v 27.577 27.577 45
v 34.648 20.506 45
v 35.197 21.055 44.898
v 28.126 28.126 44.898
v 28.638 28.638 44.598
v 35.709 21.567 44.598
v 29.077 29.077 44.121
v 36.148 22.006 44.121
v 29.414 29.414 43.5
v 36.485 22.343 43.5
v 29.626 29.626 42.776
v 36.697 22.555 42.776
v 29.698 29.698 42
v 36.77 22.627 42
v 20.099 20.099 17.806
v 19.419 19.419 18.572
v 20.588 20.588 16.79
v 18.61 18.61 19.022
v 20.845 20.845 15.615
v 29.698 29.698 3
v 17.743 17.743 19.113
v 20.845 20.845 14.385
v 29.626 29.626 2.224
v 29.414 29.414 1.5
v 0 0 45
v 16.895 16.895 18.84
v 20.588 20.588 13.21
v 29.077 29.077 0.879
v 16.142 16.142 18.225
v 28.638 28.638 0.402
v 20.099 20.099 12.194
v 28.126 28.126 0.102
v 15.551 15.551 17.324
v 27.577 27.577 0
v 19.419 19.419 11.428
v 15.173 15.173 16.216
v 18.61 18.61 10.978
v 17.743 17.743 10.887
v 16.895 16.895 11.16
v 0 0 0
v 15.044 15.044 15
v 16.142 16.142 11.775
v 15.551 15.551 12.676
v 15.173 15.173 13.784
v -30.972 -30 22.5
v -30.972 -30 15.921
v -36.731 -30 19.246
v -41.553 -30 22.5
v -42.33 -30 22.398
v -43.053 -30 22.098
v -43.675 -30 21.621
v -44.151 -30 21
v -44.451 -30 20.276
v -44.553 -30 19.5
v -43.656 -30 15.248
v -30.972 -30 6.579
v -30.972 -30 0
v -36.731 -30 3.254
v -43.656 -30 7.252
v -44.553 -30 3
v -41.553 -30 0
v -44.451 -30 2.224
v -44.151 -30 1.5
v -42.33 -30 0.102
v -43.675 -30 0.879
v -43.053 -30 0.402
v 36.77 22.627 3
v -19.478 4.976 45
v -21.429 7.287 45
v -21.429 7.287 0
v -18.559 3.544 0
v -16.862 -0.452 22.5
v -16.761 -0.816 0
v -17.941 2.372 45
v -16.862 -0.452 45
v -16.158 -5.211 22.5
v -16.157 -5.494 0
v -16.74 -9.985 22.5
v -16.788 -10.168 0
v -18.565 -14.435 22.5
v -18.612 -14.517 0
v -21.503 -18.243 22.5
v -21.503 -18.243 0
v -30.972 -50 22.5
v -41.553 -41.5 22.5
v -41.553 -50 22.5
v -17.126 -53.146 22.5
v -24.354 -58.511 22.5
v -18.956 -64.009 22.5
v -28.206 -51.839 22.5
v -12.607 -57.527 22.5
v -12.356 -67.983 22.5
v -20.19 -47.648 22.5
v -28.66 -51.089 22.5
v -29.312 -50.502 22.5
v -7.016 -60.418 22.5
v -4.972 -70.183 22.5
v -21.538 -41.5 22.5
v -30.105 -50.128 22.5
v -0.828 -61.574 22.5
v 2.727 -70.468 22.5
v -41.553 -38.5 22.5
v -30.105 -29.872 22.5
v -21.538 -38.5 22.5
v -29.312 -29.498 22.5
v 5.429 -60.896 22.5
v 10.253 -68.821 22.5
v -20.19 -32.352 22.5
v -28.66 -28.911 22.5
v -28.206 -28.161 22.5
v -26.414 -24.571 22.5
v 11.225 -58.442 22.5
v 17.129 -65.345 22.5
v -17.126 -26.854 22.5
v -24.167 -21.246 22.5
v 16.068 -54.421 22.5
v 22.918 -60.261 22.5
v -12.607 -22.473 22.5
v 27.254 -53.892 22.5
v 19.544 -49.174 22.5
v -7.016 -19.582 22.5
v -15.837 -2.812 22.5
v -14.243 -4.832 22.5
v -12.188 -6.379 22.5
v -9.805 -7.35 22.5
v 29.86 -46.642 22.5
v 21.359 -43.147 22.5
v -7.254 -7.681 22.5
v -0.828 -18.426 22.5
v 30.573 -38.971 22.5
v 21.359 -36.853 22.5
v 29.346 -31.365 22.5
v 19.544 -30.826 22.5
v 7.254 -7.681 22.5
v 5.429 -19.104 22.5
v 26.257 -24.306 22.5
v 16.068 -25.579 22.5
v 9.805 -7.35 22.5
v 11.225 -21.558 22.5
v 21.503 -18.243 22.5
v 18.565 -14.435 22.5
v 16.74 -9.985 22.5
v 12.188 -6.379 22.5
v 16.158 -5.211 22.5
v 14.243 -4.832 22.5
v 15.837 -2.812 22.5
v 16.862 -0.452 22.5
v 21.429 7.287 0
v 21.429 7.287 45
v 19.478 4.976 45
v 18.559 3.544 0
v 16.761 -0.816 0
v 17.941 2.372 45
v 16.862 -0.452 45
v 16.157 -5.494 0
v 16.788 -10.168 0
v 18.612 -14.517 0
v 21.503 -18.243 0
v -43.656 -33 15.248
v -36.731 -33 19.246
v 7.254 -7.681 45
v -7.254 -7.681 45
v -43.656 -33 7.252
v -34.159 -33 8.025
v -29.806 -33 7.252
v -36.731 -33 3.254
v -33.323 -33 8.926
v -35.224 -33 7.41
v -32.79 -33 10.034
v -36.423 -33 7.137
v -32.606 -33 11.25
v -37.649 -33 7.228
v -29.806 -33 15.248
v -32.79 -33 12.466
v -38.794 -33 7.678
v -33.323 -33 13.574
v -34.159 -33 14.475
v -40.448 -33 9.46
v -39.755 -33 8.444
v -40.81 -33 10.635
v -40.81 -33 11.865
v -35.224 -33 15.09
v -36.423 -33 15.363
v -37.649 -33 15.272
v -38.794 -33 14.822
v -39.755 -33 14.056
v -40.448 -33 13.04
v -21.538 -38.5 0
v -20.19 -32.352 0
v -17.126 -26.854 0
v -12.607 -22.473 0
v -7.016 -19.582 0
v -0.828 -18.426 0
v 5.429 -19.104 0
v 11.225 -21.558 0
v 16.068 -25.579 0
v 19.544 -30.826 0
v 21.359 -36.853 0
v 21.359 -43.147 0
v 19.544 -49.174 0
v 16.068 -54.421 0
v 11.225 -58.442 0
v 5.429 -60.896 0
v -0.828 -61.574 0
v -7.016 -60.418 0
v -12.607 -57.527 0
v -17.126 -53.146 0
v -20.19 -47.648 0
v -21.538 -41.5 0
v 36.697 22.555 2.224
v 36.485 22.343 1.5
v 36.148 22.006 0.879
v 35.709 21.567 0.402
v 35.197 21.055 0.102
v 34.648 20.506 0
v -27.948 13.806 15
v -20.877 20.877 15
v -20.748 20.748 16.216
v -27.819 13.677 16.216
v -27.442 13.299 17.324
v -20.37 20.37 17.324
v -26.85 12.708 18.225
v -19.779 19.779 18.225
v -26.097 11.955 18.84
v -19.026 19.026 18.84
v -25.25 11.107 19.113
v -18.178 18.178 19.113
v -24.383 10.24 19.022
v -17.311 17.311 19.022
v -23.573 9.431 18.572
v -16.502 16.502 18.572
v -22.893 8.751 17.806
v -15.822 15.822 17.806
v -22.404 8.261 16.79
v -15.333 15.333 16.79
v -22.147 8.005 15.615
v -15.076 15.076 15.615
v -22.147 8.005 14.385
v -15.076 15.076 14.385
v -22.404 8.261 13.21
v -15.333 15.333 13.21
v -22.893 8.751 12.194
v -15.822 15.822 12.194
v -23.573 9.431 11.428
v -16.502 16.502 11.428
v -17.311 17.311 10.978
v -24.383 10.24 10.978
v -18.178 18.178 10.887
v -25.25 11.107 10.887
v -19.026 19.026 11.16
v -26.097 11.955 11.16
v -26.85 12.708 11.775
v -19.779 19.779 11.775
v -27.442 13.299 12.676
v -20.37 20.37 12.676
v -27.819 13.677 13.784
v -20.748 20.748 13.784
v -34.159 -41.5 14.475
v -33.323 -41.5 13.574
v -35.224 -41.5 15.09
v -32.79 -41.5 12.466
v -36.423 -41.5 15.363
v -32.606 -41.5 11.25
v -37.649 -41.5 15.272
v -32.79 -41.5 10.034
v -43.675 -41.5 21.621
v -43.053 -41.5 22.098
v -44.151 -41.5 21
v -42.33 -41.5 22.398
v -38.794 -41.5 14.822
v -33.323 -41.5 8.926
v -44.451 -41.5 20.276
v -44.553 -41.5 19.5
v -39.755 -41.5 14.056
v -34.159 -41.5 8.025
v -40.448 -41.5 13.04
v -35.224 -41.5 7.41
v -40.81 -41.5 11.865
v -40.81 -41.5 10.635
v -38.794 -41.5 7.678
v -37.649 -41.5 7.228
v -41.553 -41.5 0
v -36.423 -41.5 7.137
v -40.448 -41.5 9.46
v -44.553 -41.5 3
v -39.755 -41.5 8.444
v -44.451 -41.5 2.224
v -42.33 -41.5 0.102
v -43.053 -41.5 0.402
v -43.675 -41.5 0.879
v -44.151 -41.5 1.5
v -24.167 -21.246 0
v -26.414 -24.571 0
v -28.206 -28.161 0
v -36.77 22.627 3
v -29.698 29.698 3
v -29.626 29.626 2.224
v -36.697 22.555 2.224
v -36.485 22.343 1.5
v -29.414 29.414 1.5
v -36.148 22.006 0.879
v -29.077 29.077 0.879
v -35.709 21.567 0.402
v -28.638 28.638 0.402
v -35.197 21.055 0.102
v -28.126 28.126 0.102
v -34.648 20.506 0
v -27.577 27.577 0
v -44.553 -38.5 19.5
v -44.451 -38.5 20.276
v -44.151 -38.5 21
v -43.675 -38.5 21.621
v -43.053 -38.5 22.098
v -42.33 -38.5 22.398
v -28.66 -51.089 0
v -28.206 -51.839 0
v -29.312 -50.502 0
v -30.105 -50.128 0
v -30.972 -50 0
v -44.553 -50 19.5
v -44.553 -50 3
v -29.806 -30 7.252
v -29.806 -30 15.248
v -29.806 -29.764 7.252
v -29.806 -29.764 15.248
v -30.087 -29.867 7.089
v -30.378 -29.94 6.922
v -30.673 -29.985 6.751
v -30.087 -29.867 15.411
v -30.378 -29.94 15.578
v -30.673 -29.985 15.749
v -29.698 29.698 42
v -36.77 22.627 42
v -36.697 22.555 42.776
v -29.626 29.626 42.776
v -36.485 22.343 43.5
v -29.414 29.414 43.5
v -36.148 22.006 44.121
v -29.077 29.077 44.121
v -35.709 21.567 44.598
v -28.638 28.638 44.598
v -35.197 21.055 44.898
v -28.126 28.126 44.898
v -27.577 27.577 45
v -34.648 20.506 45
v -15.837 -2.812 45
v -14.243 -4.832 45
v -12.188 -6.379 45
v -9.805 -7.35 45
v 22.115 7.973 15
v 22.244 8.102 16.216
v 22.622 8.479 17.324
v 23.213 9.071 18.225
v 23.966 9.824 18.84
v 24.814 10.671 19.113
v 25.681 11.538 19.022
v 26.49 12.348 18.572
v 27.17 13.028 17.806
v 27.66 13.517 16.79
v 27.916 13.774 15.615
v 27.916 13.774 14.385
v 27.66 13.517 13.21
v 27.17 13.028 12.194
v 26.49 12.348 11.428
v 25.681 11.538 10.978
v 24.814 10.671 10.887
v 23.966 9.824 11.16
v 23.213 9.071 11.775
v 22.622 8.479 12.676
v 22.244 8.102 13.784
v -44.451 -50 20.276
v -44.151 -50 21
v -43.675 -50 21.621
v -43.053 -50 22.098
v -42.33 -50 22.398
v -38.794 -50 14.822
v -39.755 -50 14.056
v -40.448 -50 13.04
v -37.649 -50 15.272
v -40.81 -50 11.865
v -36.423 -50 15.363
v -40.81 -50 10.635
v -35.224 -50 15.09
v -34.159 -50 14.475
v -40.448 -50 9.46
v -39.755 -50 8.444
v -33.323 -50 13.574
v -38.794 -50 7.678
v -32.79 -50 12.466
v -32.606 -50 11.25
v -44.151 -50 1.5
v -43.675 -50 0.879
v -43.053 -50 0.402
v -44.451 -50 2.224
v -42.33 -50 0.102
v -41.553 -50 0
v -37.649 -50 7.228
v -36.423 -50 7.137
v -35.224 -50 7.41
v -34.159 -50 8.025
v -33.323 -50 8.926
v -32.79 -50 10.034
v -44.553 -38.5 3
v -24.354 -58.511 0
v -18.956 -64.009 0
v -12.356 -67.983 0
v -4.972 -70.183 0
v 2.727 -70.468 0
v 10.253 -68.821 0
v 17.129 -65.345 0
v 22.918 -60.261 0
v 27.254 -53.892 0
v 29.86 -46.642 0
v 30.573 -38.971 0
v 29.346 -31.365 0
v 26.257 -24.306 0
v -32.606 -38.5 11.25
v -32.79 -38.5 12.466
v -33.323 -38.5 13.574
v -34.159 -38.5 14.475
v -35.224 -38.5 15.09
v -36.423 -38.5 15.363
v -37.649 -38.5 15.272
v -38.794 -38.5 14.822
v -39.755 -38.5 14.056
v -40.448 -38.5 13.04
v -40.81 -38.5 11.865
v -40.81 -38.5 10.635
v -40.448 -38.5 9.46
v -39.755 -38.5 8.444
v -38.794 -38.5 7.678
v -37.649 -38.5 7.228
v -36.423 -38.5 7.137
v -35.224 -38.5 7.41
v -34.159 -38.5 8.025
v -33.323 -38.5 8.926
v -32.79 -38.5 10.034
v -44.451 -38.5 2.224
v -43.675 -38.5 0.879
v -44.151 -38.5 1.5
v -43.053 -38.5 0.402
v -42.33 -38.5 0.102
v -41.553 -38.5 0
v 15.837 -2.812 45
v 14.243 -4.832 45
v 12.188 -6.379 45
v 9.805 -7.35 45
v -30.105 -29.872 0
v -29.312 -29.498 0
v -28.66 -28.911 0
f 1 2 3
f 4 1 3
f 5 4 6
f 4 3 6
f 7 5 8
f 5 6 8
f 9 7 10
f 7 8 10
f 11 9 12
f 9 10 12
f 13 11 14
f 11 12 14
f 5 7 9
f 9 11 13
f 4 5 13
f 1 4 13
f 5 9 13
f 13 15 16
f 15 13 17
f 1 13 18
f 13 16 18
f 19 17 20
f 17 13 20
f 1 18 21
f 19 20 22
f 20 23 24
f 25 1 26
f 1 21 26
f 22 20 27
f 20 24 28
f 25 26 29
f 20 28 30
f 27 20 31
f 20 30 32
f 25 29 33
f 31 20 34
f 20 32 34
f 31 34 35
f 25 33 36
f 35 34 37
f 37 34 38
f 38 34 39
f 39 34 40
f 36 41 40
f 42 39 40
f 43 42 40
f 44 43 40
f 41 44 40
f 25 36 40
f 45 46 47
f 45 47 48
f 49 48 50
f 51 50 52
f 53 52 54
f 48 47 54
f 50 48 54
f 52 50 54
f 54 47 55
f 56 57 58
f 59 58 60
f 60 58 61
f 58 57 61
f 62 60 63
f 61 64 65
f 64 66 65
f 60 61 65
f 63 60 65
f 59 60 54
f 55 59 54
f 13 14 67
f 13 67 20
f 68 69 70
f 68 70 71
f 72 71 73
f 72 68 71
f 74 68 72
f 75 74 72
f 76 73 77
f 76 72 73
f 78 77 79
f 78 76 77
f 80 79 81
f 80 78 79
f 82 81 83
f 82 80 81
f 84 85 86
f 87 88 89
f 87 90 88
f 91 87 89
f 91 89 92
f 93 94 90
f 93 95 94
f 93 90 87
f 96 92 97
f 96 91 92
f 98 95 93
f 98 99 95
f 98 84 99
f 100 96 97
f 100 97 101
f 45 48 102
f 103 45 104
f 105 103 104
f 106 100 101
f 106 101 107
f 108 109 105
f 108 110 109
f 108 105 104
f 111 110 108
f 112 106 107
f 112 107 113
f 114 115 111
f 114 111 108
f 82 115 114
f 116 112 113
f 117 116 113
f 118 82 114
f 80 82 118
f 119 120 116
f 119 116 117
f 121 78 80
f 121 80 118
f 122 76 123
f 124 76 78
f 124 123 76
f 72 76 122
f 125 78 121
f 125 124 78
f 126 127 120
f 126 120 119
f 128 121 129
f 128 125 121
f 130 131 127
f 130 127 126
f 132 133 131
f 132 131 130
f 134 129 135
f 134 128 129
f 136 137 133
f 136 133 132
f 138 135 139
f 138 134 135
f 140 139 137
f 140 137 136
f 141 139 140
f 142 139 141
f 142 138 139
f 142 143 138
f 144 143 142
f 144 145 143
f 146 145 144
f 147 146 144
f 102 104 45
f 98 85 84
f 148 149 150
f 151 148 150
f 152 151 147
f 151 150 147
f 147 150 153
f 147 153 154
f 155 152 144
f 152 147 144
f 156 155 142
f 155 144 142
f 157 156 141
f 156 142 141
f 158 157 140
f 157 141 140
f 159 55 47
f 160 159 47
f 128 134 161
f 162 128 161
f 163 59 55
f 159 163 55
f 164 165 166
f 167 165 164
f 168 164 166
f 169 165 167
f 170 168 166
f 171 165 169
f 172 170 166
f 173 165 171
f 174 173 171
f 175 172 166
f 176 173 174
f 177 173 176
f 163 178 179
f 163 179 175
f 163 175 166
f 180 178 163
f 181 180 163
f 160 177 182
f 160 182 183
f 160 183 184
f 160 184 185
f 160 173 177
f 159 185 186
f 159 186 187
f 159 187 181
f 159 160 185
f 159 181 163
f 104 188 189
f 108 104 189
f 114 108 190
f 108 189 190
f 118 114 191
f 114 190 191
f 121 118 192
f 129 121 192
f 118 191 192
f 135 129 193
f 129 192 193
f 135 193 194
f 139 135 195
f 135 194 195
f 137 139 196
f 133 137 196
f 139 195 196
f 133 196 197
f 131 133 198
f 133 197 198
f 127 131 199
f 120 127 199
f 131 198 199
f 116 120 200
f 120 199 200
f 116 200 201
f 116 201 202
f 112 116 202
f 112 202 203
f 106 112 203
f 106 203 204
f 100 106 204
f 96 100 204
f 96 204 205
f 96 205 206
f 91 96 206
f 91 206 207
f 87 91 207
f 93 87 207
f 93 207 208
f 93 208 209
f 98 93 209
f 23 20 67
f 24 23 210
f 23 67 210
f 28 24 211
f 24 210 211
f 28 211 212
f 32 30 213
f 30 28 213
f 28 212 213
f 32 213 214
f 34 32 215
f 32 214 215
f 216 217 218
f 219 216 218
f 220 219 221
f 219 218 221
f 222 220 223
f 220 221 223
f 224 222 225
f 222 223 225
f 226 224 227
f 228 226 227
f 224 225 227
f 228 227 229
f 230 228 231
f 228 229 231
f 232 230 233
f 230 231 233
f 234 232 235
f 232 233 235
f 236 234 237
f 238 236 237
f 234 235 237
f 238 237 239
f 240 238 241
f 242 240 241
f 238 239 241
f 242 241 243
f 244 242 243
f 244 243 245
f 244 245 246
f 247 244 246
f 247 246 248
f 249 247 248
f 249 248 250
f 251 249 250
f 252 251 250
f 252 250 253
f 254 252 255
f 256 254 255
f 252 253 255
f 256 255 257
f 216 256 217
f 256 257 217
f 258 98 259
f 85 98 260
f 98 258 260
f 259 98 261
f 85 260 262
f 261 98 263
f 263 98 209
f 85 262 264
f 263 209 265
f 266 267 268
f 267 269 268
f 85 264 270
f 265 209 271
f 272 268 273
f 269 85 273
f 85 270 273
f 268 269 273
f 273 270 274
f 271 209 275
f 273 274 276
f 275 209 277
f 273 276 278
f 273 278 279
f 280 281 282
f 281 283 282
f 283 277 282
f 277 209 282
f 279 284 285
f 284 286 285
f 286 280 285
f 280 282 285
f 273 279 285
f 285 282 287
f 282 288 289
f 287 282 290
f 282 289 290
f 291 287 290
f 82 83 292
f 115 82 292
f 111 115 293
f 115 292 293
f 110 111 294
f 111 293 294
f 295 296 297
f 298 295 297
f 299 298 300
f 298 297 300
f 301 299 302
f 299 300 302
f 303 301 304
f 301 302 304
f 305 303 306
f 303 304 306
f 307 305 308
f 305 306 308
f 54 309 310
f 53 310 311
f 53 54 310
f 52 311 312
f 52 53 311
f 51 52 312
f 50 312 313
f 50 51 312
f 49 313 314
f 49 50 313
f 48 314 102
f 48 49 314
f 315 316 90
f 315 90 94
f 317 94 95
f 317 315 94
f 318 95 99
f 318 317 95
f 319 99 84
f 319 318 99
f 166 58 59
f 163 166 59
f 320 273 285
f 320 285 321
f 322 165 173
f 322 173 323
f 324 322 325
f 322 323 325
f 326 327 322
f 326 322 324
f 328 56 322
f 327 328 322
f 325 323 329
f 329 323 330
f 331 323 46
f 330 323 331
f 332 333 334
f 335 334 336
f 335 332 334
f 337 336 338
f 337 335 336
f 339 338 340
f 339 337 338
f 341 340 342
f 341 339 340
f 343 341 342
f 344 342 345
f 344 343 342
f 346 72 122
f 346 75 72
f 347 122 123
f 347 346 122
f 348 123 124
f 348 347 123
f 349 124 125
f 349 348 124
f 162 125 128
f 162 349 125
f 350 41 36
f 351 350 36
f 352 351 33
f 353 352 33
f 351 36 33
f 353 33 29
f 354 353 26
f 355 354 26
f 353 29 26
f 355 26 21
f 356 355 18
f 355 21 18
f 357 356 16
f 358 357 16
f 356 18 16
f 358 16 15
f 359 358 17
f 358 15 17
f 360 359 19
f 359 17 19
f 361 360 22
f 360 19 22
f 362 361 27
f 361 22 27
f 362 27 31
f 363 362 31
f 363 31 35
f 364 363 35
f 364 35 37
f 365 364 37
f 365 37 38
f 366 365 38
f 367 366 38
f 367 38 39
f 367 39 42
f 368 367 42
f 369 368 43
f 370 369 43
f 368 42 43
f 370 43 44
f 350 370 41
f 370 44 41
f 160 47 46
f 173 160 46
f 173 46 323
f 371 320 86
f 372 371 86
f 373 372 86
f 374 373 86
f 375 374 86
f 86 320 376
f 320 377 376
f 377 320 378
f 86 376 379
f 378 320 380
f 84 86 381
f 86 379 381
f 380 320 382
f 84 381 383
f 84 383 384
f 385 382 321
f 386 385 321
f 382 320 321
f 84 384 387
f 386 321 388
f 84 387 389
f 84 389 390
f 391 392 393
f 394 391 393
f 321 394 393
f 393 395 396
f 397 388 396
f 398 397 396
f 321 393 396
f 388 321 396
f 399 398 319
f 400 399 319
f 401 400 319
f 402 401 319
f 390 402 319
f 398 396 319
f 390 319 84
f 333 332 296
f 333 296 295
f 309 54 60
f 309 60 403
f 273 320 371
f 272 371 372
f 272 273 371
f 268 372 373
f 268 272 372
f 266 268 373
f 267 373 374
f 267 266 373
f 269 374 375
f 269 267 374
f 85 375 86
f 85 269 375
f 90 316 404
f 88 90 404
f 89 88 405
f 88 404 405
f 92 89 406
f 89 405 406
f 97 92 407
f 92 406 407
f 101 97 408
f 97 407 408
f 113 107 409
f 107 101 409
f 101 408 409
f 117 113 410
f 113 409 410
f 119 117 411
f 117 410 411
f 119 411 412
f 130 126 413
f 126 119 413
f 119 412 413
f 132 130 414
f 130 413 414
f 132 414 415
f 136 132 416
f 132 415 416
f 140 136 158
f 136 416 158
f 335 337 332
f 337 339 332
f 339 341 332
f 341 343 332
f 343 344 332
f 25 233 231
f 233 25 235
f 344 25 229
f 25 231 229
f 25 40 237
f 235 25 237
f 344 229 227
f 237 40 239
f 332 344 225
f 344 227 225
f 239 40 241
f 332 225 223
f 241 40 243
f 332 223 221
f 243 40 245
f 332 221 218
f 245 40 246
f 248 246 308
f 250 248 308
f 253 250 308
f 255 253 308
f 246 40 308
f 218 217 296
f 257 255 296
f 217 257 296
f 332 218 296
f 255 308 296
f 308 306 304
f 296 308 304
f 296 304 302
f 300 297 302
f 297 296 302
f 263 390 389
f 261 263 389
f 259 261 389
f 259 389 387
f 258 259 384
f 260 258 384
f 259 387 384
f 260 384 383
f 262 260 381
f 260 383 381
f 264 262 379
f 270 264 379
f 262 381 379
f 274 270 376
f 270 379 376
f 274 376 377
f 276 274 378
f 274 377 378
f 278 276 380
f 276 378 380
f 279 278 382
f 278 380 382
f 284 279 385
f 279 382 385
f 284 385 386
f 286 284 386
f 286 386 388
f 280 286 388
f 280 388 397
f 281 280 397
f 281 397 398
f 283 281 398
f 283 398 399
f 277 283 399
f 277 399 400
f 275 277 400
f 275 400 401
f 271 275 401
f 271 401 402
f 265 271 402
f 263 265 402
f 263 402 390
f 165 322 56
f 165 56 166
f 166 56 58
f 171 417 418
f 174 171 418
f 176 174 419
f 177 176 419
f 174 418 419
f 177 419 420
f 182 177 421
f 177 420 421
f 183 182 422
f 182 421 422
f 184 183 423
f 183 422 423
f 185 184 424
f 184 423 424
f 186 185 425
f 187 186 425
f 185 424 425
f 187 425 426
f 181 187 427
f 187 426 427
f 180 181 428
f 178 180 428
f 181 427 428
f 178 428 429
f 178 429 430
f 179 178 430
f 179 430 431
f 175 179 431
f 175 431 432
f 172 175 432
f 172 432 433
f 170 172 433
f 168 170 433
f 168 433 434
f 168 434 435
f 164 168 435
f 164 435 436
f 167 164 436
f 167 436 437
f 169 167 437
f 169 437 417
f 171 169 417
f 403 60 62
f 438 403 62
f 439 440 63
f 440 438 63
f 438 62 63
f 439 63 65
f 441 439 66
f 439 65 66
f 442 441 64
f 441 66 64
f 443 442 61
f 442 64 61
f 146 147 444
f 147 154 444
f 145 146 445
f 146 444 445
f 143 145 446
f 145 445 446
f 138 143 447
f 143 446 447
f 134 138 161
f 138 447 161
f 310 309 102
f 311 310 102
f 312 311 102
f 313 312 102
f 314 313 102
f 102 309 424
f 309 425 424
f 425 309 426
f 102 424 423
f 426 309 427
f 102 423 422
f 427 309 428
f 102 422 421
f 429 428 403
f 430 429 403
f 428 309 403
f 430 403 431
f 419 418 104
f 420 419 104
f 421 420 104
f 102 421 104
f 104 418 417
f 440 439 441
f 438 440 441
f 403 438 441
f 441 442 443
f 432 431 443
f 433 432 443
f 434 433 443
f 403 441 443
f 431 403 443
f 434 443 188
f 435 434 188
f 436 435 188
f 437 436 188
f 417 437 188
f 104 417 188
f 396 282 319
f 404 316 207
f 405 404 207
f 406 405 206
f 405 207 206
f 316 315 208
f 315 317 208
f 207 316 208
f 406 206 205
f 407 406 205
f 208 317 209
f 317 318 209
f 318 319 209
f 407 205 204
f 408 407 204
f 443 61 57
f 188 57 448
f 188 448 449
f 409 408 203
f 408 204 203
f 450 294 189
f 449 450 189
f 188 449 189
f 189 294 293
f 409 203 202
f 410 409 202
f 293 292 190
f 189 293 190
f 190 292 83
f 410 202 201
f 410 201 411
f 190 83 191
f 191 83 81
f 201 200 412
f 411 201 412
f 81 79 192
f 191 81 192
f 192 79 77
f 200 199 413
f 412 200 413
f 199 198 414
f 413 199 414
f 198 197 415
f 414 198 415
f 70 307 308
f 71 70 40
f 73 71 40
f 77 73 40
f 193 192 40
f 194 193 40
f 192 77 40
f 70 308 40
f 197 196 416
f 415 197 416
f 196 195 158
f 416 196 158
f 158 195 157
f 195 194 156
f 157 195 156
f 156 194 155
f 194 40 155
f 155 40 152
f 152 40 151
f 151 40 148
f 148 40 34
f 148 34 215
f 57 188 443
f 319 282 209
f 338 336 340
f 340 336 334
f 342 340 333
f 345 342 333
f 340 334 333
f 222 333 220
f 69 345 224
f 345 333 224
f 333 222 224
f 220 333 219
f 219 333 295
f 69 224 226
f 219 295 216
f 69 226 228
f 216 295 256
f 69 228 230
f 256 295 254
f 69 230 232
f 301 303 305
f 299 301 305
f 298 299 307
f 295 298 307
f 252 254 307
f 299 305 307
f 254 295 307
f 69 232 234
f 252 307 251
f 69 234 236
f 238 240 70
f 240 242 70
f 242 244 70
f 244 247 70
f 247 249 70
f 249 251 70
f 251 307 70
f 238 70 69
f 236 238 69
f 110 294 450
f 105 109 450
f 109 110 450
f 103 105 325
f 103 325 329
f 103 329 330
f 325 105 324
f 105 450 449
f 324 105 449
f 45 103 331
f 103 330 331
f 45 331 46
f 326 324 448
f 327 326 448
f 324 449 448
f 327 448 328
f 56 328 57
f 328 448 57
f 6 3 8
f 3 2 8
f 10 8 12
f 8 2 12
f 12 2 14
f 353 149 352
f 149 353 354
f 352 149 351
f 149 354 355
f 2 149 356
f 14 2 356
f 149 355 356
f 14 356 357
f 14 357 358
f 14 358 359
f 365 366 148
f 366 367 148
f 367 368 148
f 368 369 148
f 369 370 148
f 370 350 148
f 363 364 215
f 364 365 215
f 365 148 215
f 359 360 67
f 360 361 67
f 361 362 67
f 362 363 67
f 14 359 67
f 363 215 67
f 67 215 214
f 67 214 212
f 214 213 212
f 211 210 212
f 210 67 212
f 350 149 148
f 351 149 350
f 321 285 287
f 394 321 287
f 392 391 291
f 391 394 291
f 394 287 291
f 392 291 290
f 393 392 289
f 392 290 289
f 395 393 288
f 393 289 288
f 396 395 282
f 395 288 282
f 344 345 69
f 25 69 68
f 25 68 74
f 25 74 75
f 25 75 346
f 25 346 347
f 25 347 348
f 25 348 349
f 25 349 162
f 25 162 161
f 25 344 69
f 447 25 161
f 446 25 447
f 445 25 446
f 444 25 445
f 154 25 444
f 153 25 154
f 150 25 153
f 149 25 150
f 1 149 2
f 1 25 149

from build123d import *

# Parameters (mm, degrees)
F1_DEPTH      = 45
F2_R          = 4.125
F3_DEPTH      = 10
F4_R          = 4.125
F5_DEPTH      = 10
F6_R          = 4.125
F7_DEPTH      = 20
F9_DEPTH      = 3
F10_R         = 18
F11_W         = 72.4435358676
F11_H         = 36.0539390085
F12_DEPTH     = 100
F13_T1_DEPTH  = 22.5
F13_T6_DEPTH  = 22.5
F13_T12_DEPTH = 22.5
F13_T18_DEPTH = 22.5
F13_T25_DEPTH = 22.5
F13_T31_DEPTH = 22.5
F13_T34_DEPTH = 23.5
F13_T36_DEPTH = 23.5
F13_T38_DEPTH = 25
F13_T40_DEPTH = 25
F14_R         = 10


# Not quite as in the source:
# - a fillet or chamfer that OpenCascade refuses, or shapes differently, is made with other operations: its cross-section is extruded or revolved along the edge and cut away or added


with BuildPart() as f1:
    # F0 (on Top) → F1 (new body)
    with BuildSketch(Plane.XY):
        with BuildLine():
            Line((29.6984848098, 29.6984848098), (0, 0))
            Line((0, 0), (-29.6984848098, 29.6984848098))
            Line((-29.6984848098, 29.6984848098), (-36.7695526217, 22.627416998))
            Line((-36.7695526217, 22.627416998), (-4.4122546938, -9.7298809299))
            ThreePointArc((-4.4122546938, -9.7298809299), (-19.5013094439, -16.4320762481), (-28.9093081896, -30))
            ThreePointArc((-28.9093081896, -30), (-30.0334813831, -34.1915496034), (-30.5532011416, -38.5))
            Line((-30.5532011416, -38.5), (-21.53782951, -38.5))
            ThreePointArc((-21.53782951, -38.5), (21.59, -40), (-21.53782951, -41.5))
            Line((-21.53782951, -41.5), (-30.5532011416, -41.5))
            ThreePointArc((-30.5532011416, -41.5), (-30.0334813831, -45.8084503966), (-28.9093081896, -50))
            ThreePointArc((-28.9093081896, -50), (23.5679237519, -59.5013094439), (4.4122546938, -9.7298809299))
            Line((4.4122546938, -9.7298809299), (36.7695526217, 22.627416998))
            Line((36.7695526217, 22.627416998), (29.6984848098, 29.6984848098))
        make_face()
        with BuildLine():
            ThreePointArc((-30.5532011416, -38.5), (-30.0334813831, -34.1915496034), (-28.9093081896, -30))
            Line((-28.9093081896, -30), (-44.5532011416, -30))
            Line((-44.5532011416, -30), (-44.5532011416, -38.5))
            Line((-44.5532011416, -38.5), (-30.5532011416, -38.5))
        make_face()
        with BuildLine():
            Line((-44.5532011416, -50), (-28.9093081896, -50))
            ThreePointArc((-28.9093081896, -50), (-30.0334813831, -45.8084503966), (-30.5532011416, -41.5))
            Line((-30.5532011416, -41.5), (-44.5532011416, -41.5))
            Line((-44.5532011416, -41.5), (-44.5532011416, -50))
        make_face()
    extrude(amount=F1_DEPTH)

    # F2 (on face) → F3 (cut, through all)
    with BuildSketch(Plane(origin=(0, 0, 0), x_dir=(-0.7071067812, -0.7071067812, 0), z_dir=(-0.7071067812, 0.7071067812, 0))):
        with Locations((-25.4, 15)):
            Circle(F2_R)
    extrude(amount=-F3_DEPTH, mode=Mode.SUBTRACT)

    # F4 (on face) → F5 (cut, through all)
    with BuildSketch(Plane(origin=(0, 0, 0), x_dir=(-0.7071067812, 0.7071067812, 0), z_dir=(0.7071067812, 0.7071067812, 0))):
        with Locations((25.4, 15)):
            Circle(F4_R)
    extrude(amount=-F5_DEPTH, mode=Mode.SUBTRACT)

    # F6 (on face) → F7 (cut, through all)
    with BuildSketch(Plane.XZ.offset(50)):
        with Locations((-36.7312546656, 33.75)):
            Circle(F6_R)
        with Locations((-36.7312546656, 11.25)):
            Circle(F6_R)
    extrude(amount=-F7_DEPTH, mode=Mode.SUBTRACT)

    # F8 (on face) → F9 (cut)
    with BuildSketch(Plane(origin=(0, -30, 0), x_dir=(-1, 0, 0), z_dir=(0, 1, 0))):
        Polygon((43.6562546656, 37.7481506141), (36.7312546656, 41.7463012283), (29.8062546656, 37.7481506141), (29.8062546656, 29.7518493859), (36.7312546656, 25.7536987717), (43.6562546656, 29.7518493859), align=None)
        Polygon((43.6562546656, 7.2518493859), (43.6562546656, 15.2481506141), (36.7312546656, 19.2463012283), (29.8062546656, 15.2481506141), (29.8062546656, 7.2518493859), (36.7312546656, 3.2536987717), align=None)
    extrude(amount=-F9_DEPTH, mode=Mode.SUBTRACT)

    # F10
    f10_edges = [f1.edges().sort_by_distance(p)[0] for p in [
        (-4.412255, -9.729881, 22.5),
        (4.412255, -9.729881, 22.5),
    ]]
    fillet(f10_edges, radius=F10_R)

    # F11 (on Right) → F12 (cut, symmetric)
    with BuildSketch(Plane.YZ):
        with Locations((-43.9025410381, 40.5269695042)):
            Rectangle(F11_W, F11_H)
    extrude(amount=F12_DEPTH, both=True, mode=Mode.SUBTRACT)

    # F13: fillet of radius 3 on 10 edges, made by hand

    # F13_s2 → F13_t1 (join)
    with BuildSketch(Plane.XY):
        with BuildLine():
            ThreePointArc((-28.206162374, -51.8389401608), (-29.3115301597, -50.5016826145), (-30.9723764022, -50))
            Line((-30.9723764022, -50), (-28.9093081896, -50))
            ThreePointArc((-28.9093081896, -50), (-28.5725334833, -50.9251283904), (-28.206162374, -51.8389401608))
        make_face()
    extrude(amount=F13_T1_DEPTH)


with BuildPart() as f13_tool4:
    # F13_s5 → F13_t6 (new body)
    with BuildSketch(Plane.XY):
        with BuildLine():
            ThreePointArc((-28.206162374, -28.1610598392), (-29.3115301597, -29.4983173855), (-30.9723764022, -30))
            Line((-30.9723764022, -30), (-28.9093081896, -30))
            ThreePointArc((-28.9093081896, -30), (-28.5725334833, -29.0748716096), (-28.206162374, -28.1610598392))
        make_face()
    extrude(amount=F13_T6_DEPTH)

    split(bisect_by=Plane(origin=(-10.5917065627, 0, 18.3453739054), x_dir=(0, 1, 0), z_dir=(0.5, 0, -0.8660254038)), keep=Keep.TOP)

    split(bisect_by=Plane.YZ.offset(-29.8062546656), keep=Keep.TOP)


with BuildPart() as f1_1:
    add(f1.part)

    # F13_t3: union F13_tool4
    add(f13_tool4.part)


with BuildPart() as f13_tool10:
    # F13_s11 → F13_t12 (new body)
    with BuildSketch(Plane.XY):
        with BuildLine():
            ThreePointArc((-28.206162374, -28.1610598392), (-29.3115301597, -29.4983173855), (-30.9723764022, -30))
            Line((-30.9723764022, -30), (-28.9093081896, -30))
            ThreePointArc((-28.9093081896, -30), (-28.5725334833, -29.0748716096), (-28.206162374, -28.1610598392))
        make_face()
    extrude(amount=F13_T12_DEPTH)

    split(bisect_by=Plane(origin=(-10.5917065627, 0, 18.3453739054), x_dir=(0, 1, 0), z_dir=(0.5, 0, -0.8660254038)), keep=Keep.TOP)

    split(bisect_by=Plane.YZ.offset(-29.8062546656), keep=Keep.BOTTOM)


with BuildPart() as f1_2:
    add(f1_1.part)

    # F13_t9: union F13_tool10
    add(f13_tool10.part)


with BuildPart() as f13_tool16:
    # F13_s17 → F13_t18 (new body)
    with BuildSketch(Plane.XY):
        with BuildLine():
            ThreePointArc((-28.206162374, -28.1610598392), (-29.3115301597, -29.4983173855), (-30.9723764022, -30))
            Line((-30.9723764022, -30), (-28.9093081896, -30))
            ThreePointArc((-28.9093081896, -30), (-28.5725334833, -29.0748716096), (-28.206162374, -28.1610598392))
        make_face()
    extrude(amount=F13_T18_DEPTH)

    split(bisect_by=Plane(origin=(-10.5917065627, 0, 18.3453739054), x_dir=(0, 1, 0), z_dir=(-0.5, 0, 0.8660254038)), keep=Keep.TOP)

    split(bisect_by=Plane.YZ.offset(-29.8062546656), keep=Keep.TOP)

    split(bisect_by=Plane(origin=(-0.8489207701, 0, -1.4703739054), x_dir=(0, 1, 0), z_dir=(-0.5, 0, -0.8660254038)), keep=Keep.TOP)


with BuildPart() as f1_3:
    add(f1_2.part)

    # F13_t15: union F13_tool16
    add(f13_tool16.part)


with BuildPart() as f13_tool23:
    # F13_s24 → F13_t25 (new body)
    with BuildSketch(Plane.XY):
        with BuildLine():
            ThreePointArc((-28.206162374, -28.1610598392), (-29.3115301597, -29.4983173855), (-30.9723764022, -30))
            Line((-30.9723764022, -30), (-28.9093081896, -30))
            ThreePointArc((-28.9093081896, -30), (-28.5725334833, -29.0748716096), (-28.206162374, -28.1610598392))
        make_face()
    extrude(amount=F13_T25_DEPTH)

    split(bisect_by=Plane.YZ.offset(-29.8062546656), keep=Keep.TOP)

    split(bisect_by=Plane(origin=(-0.8489207701, 0, -1.4703739054), x_dir=(0, 1, 0), z_dir=(0.5, 0, 0.8660254038)), keep=Keep.TOP)


with BuildPart() as f1_4:
    add(f1_3.part)

    # F13_t22: union F13_tool23
    add(f13_tool23.part)


with BuildPart() as f13_tool29:
    # F13_s30 → F13_t31 (new body)
    with BuildSketch(Plane.XY):
        with BuildLine():
            ThreePointArc((-28.206162374, -28.1610598392), (-29.3115301597, -29.4983173855), (-30.9723764022, -30))
            Line((-30.9723764022, -30), (-28.9093081896, -30))
            ThreePointArc((-28.9093081896, -30), (-28.5725334833, -29.0748716096), (-28.206162374, -28.1610598392))
        make_face()
    extrude(amount=F13_T31_DEPTH)

    split(bisect_by=Plane.YZ.offset(-29.8062546656), keep=Keep.BOTTOM)

    split(bisect_by=Plane(origin=(-0.8489207701, 0, -1.4703739054), x_dir=(0, 1, 0), z_dir=(0.5, 0, 0.8660254038)), keep=Keep.TOP)


with BuildPart() as f1_5:
    add(f1_4.part)

    # F13_t28: union F13_tool29
    add(f13_tool29.part)

    # F13_s35 → F13_t34 (cut)
    with BuildSketch(Plane.XZ.offset(34)):
        with BuildLine():
            ThreePointArc((-44.5532011416, 3), (-43.6745214852, 0.8786796564), (-41.5532011416, 0))
            Line((-41.5532011416, 0), (-44.5532011416, 0))
            Line((-44.5532011416, 0), (-44.5532011416, 3))
        make_face()
        with BuildLine():
            ThreePointArc((-44.5532011416, 19.5), (-43.6745214852, 21.6213203436), (-41.5532011416, 22.5))
            Line((-41.5532011416, 22.5), (-44.5532011416, 22.5))
            Line((-44.5532011416, 22.5), (-44.5532011416, 19.5))
        make_face()
    extrude(amount=F13_T34_DEPTH, mode=Mode.SUBTRACT)

    # F13_s37 → F13_t36 (cut)
    with BuildSketch(Plane.XZ.offset(22.5)):
        with BuildLine():
            ThreePointArc((-44.5532011416, 3), (-43.6745214852, 0.8786796564), (-41.5532011416, 0))
            Line((-41.5532011416, 0), (-44.5532011416, 0))
            Line((-44.5532011416, 0), (-44.5532011416, 3))
        make_face()
        with BuildLine():
            ThreePointArc((-44.5532011416, 19.5), (-43.6745214852, 21.6213203436), (-41.5532011416, 22.5))
            Line((-41.5532011416, 22.5), (-44.5532011416, 22.5))
            Line((-44.5532011416, 22.5), (-44.5532011416, 19.5))
        make_face()
    extrude(amount=F13_T36_DEPTH, mode=Mode.SUBTRACT)

    # F13_s39 → F13_t38 (cut)
    with BuildSketch(Plane(origin=(5.3033008589, 5.3033008589, 0), x_dir=(0, 0, 1), z_dir=(-0.7071067812, -0.7071067812, 0))):
        with BuildLine():
            ThreePointArc((42, 42), (44.1213203436, 41.1213203436), (45, 39))
            Line((45, 39), (45, 42))
            Line((45, 42), (42, 42))
        make_face()
        with BuildLine():
            ThreePointArc((3, 42), (0.8786796564, 41.1213203436), (0, 39))
            Line((0, 39), (0, 42))
            Line((0, 42), (3, 42))
        make_face()
    extrude(amount=F13_T38_DEPTH, mode=Mode.SUBTRACT)

    # F13_s41 → F13_t40 (cut)
    with BuildSketch(Plane(origin=(12.3743686708, -12.3743686708, 0), x_dir=(0, 0, 1), z_dir=(-0.7071067812, 0.7071067812, 0))):
        with BuildLine():
            ThreePointArc((45, 39), (44.1213203436, 41.1213203436), (42, 42))
            Line((42, 42), (45, 42))
            Line((45, 42), (45, 39))
        make_face()
        with BuildLine():
            ThreePointArc((3, 42), (0.8786796564, 41.1213203436), (0, 39))
            Line((0, 39), (0, 42))
            Line((0, 42), (3, 42))
        make_face()
    extrude(amount=F13_T40_DEPTH, mode=Mode.SUBTRACT)

    # F14
    f14_edges = [f1_5.edges().sort_by_distance(p)[0] for p in [
        (-16.296581, -7.680773, 33.75),
        (16.296581, -7.680773, 33.75),
    ]]
    fillet(f14_edges, radius=F14_R)


solid = f1_5.part
